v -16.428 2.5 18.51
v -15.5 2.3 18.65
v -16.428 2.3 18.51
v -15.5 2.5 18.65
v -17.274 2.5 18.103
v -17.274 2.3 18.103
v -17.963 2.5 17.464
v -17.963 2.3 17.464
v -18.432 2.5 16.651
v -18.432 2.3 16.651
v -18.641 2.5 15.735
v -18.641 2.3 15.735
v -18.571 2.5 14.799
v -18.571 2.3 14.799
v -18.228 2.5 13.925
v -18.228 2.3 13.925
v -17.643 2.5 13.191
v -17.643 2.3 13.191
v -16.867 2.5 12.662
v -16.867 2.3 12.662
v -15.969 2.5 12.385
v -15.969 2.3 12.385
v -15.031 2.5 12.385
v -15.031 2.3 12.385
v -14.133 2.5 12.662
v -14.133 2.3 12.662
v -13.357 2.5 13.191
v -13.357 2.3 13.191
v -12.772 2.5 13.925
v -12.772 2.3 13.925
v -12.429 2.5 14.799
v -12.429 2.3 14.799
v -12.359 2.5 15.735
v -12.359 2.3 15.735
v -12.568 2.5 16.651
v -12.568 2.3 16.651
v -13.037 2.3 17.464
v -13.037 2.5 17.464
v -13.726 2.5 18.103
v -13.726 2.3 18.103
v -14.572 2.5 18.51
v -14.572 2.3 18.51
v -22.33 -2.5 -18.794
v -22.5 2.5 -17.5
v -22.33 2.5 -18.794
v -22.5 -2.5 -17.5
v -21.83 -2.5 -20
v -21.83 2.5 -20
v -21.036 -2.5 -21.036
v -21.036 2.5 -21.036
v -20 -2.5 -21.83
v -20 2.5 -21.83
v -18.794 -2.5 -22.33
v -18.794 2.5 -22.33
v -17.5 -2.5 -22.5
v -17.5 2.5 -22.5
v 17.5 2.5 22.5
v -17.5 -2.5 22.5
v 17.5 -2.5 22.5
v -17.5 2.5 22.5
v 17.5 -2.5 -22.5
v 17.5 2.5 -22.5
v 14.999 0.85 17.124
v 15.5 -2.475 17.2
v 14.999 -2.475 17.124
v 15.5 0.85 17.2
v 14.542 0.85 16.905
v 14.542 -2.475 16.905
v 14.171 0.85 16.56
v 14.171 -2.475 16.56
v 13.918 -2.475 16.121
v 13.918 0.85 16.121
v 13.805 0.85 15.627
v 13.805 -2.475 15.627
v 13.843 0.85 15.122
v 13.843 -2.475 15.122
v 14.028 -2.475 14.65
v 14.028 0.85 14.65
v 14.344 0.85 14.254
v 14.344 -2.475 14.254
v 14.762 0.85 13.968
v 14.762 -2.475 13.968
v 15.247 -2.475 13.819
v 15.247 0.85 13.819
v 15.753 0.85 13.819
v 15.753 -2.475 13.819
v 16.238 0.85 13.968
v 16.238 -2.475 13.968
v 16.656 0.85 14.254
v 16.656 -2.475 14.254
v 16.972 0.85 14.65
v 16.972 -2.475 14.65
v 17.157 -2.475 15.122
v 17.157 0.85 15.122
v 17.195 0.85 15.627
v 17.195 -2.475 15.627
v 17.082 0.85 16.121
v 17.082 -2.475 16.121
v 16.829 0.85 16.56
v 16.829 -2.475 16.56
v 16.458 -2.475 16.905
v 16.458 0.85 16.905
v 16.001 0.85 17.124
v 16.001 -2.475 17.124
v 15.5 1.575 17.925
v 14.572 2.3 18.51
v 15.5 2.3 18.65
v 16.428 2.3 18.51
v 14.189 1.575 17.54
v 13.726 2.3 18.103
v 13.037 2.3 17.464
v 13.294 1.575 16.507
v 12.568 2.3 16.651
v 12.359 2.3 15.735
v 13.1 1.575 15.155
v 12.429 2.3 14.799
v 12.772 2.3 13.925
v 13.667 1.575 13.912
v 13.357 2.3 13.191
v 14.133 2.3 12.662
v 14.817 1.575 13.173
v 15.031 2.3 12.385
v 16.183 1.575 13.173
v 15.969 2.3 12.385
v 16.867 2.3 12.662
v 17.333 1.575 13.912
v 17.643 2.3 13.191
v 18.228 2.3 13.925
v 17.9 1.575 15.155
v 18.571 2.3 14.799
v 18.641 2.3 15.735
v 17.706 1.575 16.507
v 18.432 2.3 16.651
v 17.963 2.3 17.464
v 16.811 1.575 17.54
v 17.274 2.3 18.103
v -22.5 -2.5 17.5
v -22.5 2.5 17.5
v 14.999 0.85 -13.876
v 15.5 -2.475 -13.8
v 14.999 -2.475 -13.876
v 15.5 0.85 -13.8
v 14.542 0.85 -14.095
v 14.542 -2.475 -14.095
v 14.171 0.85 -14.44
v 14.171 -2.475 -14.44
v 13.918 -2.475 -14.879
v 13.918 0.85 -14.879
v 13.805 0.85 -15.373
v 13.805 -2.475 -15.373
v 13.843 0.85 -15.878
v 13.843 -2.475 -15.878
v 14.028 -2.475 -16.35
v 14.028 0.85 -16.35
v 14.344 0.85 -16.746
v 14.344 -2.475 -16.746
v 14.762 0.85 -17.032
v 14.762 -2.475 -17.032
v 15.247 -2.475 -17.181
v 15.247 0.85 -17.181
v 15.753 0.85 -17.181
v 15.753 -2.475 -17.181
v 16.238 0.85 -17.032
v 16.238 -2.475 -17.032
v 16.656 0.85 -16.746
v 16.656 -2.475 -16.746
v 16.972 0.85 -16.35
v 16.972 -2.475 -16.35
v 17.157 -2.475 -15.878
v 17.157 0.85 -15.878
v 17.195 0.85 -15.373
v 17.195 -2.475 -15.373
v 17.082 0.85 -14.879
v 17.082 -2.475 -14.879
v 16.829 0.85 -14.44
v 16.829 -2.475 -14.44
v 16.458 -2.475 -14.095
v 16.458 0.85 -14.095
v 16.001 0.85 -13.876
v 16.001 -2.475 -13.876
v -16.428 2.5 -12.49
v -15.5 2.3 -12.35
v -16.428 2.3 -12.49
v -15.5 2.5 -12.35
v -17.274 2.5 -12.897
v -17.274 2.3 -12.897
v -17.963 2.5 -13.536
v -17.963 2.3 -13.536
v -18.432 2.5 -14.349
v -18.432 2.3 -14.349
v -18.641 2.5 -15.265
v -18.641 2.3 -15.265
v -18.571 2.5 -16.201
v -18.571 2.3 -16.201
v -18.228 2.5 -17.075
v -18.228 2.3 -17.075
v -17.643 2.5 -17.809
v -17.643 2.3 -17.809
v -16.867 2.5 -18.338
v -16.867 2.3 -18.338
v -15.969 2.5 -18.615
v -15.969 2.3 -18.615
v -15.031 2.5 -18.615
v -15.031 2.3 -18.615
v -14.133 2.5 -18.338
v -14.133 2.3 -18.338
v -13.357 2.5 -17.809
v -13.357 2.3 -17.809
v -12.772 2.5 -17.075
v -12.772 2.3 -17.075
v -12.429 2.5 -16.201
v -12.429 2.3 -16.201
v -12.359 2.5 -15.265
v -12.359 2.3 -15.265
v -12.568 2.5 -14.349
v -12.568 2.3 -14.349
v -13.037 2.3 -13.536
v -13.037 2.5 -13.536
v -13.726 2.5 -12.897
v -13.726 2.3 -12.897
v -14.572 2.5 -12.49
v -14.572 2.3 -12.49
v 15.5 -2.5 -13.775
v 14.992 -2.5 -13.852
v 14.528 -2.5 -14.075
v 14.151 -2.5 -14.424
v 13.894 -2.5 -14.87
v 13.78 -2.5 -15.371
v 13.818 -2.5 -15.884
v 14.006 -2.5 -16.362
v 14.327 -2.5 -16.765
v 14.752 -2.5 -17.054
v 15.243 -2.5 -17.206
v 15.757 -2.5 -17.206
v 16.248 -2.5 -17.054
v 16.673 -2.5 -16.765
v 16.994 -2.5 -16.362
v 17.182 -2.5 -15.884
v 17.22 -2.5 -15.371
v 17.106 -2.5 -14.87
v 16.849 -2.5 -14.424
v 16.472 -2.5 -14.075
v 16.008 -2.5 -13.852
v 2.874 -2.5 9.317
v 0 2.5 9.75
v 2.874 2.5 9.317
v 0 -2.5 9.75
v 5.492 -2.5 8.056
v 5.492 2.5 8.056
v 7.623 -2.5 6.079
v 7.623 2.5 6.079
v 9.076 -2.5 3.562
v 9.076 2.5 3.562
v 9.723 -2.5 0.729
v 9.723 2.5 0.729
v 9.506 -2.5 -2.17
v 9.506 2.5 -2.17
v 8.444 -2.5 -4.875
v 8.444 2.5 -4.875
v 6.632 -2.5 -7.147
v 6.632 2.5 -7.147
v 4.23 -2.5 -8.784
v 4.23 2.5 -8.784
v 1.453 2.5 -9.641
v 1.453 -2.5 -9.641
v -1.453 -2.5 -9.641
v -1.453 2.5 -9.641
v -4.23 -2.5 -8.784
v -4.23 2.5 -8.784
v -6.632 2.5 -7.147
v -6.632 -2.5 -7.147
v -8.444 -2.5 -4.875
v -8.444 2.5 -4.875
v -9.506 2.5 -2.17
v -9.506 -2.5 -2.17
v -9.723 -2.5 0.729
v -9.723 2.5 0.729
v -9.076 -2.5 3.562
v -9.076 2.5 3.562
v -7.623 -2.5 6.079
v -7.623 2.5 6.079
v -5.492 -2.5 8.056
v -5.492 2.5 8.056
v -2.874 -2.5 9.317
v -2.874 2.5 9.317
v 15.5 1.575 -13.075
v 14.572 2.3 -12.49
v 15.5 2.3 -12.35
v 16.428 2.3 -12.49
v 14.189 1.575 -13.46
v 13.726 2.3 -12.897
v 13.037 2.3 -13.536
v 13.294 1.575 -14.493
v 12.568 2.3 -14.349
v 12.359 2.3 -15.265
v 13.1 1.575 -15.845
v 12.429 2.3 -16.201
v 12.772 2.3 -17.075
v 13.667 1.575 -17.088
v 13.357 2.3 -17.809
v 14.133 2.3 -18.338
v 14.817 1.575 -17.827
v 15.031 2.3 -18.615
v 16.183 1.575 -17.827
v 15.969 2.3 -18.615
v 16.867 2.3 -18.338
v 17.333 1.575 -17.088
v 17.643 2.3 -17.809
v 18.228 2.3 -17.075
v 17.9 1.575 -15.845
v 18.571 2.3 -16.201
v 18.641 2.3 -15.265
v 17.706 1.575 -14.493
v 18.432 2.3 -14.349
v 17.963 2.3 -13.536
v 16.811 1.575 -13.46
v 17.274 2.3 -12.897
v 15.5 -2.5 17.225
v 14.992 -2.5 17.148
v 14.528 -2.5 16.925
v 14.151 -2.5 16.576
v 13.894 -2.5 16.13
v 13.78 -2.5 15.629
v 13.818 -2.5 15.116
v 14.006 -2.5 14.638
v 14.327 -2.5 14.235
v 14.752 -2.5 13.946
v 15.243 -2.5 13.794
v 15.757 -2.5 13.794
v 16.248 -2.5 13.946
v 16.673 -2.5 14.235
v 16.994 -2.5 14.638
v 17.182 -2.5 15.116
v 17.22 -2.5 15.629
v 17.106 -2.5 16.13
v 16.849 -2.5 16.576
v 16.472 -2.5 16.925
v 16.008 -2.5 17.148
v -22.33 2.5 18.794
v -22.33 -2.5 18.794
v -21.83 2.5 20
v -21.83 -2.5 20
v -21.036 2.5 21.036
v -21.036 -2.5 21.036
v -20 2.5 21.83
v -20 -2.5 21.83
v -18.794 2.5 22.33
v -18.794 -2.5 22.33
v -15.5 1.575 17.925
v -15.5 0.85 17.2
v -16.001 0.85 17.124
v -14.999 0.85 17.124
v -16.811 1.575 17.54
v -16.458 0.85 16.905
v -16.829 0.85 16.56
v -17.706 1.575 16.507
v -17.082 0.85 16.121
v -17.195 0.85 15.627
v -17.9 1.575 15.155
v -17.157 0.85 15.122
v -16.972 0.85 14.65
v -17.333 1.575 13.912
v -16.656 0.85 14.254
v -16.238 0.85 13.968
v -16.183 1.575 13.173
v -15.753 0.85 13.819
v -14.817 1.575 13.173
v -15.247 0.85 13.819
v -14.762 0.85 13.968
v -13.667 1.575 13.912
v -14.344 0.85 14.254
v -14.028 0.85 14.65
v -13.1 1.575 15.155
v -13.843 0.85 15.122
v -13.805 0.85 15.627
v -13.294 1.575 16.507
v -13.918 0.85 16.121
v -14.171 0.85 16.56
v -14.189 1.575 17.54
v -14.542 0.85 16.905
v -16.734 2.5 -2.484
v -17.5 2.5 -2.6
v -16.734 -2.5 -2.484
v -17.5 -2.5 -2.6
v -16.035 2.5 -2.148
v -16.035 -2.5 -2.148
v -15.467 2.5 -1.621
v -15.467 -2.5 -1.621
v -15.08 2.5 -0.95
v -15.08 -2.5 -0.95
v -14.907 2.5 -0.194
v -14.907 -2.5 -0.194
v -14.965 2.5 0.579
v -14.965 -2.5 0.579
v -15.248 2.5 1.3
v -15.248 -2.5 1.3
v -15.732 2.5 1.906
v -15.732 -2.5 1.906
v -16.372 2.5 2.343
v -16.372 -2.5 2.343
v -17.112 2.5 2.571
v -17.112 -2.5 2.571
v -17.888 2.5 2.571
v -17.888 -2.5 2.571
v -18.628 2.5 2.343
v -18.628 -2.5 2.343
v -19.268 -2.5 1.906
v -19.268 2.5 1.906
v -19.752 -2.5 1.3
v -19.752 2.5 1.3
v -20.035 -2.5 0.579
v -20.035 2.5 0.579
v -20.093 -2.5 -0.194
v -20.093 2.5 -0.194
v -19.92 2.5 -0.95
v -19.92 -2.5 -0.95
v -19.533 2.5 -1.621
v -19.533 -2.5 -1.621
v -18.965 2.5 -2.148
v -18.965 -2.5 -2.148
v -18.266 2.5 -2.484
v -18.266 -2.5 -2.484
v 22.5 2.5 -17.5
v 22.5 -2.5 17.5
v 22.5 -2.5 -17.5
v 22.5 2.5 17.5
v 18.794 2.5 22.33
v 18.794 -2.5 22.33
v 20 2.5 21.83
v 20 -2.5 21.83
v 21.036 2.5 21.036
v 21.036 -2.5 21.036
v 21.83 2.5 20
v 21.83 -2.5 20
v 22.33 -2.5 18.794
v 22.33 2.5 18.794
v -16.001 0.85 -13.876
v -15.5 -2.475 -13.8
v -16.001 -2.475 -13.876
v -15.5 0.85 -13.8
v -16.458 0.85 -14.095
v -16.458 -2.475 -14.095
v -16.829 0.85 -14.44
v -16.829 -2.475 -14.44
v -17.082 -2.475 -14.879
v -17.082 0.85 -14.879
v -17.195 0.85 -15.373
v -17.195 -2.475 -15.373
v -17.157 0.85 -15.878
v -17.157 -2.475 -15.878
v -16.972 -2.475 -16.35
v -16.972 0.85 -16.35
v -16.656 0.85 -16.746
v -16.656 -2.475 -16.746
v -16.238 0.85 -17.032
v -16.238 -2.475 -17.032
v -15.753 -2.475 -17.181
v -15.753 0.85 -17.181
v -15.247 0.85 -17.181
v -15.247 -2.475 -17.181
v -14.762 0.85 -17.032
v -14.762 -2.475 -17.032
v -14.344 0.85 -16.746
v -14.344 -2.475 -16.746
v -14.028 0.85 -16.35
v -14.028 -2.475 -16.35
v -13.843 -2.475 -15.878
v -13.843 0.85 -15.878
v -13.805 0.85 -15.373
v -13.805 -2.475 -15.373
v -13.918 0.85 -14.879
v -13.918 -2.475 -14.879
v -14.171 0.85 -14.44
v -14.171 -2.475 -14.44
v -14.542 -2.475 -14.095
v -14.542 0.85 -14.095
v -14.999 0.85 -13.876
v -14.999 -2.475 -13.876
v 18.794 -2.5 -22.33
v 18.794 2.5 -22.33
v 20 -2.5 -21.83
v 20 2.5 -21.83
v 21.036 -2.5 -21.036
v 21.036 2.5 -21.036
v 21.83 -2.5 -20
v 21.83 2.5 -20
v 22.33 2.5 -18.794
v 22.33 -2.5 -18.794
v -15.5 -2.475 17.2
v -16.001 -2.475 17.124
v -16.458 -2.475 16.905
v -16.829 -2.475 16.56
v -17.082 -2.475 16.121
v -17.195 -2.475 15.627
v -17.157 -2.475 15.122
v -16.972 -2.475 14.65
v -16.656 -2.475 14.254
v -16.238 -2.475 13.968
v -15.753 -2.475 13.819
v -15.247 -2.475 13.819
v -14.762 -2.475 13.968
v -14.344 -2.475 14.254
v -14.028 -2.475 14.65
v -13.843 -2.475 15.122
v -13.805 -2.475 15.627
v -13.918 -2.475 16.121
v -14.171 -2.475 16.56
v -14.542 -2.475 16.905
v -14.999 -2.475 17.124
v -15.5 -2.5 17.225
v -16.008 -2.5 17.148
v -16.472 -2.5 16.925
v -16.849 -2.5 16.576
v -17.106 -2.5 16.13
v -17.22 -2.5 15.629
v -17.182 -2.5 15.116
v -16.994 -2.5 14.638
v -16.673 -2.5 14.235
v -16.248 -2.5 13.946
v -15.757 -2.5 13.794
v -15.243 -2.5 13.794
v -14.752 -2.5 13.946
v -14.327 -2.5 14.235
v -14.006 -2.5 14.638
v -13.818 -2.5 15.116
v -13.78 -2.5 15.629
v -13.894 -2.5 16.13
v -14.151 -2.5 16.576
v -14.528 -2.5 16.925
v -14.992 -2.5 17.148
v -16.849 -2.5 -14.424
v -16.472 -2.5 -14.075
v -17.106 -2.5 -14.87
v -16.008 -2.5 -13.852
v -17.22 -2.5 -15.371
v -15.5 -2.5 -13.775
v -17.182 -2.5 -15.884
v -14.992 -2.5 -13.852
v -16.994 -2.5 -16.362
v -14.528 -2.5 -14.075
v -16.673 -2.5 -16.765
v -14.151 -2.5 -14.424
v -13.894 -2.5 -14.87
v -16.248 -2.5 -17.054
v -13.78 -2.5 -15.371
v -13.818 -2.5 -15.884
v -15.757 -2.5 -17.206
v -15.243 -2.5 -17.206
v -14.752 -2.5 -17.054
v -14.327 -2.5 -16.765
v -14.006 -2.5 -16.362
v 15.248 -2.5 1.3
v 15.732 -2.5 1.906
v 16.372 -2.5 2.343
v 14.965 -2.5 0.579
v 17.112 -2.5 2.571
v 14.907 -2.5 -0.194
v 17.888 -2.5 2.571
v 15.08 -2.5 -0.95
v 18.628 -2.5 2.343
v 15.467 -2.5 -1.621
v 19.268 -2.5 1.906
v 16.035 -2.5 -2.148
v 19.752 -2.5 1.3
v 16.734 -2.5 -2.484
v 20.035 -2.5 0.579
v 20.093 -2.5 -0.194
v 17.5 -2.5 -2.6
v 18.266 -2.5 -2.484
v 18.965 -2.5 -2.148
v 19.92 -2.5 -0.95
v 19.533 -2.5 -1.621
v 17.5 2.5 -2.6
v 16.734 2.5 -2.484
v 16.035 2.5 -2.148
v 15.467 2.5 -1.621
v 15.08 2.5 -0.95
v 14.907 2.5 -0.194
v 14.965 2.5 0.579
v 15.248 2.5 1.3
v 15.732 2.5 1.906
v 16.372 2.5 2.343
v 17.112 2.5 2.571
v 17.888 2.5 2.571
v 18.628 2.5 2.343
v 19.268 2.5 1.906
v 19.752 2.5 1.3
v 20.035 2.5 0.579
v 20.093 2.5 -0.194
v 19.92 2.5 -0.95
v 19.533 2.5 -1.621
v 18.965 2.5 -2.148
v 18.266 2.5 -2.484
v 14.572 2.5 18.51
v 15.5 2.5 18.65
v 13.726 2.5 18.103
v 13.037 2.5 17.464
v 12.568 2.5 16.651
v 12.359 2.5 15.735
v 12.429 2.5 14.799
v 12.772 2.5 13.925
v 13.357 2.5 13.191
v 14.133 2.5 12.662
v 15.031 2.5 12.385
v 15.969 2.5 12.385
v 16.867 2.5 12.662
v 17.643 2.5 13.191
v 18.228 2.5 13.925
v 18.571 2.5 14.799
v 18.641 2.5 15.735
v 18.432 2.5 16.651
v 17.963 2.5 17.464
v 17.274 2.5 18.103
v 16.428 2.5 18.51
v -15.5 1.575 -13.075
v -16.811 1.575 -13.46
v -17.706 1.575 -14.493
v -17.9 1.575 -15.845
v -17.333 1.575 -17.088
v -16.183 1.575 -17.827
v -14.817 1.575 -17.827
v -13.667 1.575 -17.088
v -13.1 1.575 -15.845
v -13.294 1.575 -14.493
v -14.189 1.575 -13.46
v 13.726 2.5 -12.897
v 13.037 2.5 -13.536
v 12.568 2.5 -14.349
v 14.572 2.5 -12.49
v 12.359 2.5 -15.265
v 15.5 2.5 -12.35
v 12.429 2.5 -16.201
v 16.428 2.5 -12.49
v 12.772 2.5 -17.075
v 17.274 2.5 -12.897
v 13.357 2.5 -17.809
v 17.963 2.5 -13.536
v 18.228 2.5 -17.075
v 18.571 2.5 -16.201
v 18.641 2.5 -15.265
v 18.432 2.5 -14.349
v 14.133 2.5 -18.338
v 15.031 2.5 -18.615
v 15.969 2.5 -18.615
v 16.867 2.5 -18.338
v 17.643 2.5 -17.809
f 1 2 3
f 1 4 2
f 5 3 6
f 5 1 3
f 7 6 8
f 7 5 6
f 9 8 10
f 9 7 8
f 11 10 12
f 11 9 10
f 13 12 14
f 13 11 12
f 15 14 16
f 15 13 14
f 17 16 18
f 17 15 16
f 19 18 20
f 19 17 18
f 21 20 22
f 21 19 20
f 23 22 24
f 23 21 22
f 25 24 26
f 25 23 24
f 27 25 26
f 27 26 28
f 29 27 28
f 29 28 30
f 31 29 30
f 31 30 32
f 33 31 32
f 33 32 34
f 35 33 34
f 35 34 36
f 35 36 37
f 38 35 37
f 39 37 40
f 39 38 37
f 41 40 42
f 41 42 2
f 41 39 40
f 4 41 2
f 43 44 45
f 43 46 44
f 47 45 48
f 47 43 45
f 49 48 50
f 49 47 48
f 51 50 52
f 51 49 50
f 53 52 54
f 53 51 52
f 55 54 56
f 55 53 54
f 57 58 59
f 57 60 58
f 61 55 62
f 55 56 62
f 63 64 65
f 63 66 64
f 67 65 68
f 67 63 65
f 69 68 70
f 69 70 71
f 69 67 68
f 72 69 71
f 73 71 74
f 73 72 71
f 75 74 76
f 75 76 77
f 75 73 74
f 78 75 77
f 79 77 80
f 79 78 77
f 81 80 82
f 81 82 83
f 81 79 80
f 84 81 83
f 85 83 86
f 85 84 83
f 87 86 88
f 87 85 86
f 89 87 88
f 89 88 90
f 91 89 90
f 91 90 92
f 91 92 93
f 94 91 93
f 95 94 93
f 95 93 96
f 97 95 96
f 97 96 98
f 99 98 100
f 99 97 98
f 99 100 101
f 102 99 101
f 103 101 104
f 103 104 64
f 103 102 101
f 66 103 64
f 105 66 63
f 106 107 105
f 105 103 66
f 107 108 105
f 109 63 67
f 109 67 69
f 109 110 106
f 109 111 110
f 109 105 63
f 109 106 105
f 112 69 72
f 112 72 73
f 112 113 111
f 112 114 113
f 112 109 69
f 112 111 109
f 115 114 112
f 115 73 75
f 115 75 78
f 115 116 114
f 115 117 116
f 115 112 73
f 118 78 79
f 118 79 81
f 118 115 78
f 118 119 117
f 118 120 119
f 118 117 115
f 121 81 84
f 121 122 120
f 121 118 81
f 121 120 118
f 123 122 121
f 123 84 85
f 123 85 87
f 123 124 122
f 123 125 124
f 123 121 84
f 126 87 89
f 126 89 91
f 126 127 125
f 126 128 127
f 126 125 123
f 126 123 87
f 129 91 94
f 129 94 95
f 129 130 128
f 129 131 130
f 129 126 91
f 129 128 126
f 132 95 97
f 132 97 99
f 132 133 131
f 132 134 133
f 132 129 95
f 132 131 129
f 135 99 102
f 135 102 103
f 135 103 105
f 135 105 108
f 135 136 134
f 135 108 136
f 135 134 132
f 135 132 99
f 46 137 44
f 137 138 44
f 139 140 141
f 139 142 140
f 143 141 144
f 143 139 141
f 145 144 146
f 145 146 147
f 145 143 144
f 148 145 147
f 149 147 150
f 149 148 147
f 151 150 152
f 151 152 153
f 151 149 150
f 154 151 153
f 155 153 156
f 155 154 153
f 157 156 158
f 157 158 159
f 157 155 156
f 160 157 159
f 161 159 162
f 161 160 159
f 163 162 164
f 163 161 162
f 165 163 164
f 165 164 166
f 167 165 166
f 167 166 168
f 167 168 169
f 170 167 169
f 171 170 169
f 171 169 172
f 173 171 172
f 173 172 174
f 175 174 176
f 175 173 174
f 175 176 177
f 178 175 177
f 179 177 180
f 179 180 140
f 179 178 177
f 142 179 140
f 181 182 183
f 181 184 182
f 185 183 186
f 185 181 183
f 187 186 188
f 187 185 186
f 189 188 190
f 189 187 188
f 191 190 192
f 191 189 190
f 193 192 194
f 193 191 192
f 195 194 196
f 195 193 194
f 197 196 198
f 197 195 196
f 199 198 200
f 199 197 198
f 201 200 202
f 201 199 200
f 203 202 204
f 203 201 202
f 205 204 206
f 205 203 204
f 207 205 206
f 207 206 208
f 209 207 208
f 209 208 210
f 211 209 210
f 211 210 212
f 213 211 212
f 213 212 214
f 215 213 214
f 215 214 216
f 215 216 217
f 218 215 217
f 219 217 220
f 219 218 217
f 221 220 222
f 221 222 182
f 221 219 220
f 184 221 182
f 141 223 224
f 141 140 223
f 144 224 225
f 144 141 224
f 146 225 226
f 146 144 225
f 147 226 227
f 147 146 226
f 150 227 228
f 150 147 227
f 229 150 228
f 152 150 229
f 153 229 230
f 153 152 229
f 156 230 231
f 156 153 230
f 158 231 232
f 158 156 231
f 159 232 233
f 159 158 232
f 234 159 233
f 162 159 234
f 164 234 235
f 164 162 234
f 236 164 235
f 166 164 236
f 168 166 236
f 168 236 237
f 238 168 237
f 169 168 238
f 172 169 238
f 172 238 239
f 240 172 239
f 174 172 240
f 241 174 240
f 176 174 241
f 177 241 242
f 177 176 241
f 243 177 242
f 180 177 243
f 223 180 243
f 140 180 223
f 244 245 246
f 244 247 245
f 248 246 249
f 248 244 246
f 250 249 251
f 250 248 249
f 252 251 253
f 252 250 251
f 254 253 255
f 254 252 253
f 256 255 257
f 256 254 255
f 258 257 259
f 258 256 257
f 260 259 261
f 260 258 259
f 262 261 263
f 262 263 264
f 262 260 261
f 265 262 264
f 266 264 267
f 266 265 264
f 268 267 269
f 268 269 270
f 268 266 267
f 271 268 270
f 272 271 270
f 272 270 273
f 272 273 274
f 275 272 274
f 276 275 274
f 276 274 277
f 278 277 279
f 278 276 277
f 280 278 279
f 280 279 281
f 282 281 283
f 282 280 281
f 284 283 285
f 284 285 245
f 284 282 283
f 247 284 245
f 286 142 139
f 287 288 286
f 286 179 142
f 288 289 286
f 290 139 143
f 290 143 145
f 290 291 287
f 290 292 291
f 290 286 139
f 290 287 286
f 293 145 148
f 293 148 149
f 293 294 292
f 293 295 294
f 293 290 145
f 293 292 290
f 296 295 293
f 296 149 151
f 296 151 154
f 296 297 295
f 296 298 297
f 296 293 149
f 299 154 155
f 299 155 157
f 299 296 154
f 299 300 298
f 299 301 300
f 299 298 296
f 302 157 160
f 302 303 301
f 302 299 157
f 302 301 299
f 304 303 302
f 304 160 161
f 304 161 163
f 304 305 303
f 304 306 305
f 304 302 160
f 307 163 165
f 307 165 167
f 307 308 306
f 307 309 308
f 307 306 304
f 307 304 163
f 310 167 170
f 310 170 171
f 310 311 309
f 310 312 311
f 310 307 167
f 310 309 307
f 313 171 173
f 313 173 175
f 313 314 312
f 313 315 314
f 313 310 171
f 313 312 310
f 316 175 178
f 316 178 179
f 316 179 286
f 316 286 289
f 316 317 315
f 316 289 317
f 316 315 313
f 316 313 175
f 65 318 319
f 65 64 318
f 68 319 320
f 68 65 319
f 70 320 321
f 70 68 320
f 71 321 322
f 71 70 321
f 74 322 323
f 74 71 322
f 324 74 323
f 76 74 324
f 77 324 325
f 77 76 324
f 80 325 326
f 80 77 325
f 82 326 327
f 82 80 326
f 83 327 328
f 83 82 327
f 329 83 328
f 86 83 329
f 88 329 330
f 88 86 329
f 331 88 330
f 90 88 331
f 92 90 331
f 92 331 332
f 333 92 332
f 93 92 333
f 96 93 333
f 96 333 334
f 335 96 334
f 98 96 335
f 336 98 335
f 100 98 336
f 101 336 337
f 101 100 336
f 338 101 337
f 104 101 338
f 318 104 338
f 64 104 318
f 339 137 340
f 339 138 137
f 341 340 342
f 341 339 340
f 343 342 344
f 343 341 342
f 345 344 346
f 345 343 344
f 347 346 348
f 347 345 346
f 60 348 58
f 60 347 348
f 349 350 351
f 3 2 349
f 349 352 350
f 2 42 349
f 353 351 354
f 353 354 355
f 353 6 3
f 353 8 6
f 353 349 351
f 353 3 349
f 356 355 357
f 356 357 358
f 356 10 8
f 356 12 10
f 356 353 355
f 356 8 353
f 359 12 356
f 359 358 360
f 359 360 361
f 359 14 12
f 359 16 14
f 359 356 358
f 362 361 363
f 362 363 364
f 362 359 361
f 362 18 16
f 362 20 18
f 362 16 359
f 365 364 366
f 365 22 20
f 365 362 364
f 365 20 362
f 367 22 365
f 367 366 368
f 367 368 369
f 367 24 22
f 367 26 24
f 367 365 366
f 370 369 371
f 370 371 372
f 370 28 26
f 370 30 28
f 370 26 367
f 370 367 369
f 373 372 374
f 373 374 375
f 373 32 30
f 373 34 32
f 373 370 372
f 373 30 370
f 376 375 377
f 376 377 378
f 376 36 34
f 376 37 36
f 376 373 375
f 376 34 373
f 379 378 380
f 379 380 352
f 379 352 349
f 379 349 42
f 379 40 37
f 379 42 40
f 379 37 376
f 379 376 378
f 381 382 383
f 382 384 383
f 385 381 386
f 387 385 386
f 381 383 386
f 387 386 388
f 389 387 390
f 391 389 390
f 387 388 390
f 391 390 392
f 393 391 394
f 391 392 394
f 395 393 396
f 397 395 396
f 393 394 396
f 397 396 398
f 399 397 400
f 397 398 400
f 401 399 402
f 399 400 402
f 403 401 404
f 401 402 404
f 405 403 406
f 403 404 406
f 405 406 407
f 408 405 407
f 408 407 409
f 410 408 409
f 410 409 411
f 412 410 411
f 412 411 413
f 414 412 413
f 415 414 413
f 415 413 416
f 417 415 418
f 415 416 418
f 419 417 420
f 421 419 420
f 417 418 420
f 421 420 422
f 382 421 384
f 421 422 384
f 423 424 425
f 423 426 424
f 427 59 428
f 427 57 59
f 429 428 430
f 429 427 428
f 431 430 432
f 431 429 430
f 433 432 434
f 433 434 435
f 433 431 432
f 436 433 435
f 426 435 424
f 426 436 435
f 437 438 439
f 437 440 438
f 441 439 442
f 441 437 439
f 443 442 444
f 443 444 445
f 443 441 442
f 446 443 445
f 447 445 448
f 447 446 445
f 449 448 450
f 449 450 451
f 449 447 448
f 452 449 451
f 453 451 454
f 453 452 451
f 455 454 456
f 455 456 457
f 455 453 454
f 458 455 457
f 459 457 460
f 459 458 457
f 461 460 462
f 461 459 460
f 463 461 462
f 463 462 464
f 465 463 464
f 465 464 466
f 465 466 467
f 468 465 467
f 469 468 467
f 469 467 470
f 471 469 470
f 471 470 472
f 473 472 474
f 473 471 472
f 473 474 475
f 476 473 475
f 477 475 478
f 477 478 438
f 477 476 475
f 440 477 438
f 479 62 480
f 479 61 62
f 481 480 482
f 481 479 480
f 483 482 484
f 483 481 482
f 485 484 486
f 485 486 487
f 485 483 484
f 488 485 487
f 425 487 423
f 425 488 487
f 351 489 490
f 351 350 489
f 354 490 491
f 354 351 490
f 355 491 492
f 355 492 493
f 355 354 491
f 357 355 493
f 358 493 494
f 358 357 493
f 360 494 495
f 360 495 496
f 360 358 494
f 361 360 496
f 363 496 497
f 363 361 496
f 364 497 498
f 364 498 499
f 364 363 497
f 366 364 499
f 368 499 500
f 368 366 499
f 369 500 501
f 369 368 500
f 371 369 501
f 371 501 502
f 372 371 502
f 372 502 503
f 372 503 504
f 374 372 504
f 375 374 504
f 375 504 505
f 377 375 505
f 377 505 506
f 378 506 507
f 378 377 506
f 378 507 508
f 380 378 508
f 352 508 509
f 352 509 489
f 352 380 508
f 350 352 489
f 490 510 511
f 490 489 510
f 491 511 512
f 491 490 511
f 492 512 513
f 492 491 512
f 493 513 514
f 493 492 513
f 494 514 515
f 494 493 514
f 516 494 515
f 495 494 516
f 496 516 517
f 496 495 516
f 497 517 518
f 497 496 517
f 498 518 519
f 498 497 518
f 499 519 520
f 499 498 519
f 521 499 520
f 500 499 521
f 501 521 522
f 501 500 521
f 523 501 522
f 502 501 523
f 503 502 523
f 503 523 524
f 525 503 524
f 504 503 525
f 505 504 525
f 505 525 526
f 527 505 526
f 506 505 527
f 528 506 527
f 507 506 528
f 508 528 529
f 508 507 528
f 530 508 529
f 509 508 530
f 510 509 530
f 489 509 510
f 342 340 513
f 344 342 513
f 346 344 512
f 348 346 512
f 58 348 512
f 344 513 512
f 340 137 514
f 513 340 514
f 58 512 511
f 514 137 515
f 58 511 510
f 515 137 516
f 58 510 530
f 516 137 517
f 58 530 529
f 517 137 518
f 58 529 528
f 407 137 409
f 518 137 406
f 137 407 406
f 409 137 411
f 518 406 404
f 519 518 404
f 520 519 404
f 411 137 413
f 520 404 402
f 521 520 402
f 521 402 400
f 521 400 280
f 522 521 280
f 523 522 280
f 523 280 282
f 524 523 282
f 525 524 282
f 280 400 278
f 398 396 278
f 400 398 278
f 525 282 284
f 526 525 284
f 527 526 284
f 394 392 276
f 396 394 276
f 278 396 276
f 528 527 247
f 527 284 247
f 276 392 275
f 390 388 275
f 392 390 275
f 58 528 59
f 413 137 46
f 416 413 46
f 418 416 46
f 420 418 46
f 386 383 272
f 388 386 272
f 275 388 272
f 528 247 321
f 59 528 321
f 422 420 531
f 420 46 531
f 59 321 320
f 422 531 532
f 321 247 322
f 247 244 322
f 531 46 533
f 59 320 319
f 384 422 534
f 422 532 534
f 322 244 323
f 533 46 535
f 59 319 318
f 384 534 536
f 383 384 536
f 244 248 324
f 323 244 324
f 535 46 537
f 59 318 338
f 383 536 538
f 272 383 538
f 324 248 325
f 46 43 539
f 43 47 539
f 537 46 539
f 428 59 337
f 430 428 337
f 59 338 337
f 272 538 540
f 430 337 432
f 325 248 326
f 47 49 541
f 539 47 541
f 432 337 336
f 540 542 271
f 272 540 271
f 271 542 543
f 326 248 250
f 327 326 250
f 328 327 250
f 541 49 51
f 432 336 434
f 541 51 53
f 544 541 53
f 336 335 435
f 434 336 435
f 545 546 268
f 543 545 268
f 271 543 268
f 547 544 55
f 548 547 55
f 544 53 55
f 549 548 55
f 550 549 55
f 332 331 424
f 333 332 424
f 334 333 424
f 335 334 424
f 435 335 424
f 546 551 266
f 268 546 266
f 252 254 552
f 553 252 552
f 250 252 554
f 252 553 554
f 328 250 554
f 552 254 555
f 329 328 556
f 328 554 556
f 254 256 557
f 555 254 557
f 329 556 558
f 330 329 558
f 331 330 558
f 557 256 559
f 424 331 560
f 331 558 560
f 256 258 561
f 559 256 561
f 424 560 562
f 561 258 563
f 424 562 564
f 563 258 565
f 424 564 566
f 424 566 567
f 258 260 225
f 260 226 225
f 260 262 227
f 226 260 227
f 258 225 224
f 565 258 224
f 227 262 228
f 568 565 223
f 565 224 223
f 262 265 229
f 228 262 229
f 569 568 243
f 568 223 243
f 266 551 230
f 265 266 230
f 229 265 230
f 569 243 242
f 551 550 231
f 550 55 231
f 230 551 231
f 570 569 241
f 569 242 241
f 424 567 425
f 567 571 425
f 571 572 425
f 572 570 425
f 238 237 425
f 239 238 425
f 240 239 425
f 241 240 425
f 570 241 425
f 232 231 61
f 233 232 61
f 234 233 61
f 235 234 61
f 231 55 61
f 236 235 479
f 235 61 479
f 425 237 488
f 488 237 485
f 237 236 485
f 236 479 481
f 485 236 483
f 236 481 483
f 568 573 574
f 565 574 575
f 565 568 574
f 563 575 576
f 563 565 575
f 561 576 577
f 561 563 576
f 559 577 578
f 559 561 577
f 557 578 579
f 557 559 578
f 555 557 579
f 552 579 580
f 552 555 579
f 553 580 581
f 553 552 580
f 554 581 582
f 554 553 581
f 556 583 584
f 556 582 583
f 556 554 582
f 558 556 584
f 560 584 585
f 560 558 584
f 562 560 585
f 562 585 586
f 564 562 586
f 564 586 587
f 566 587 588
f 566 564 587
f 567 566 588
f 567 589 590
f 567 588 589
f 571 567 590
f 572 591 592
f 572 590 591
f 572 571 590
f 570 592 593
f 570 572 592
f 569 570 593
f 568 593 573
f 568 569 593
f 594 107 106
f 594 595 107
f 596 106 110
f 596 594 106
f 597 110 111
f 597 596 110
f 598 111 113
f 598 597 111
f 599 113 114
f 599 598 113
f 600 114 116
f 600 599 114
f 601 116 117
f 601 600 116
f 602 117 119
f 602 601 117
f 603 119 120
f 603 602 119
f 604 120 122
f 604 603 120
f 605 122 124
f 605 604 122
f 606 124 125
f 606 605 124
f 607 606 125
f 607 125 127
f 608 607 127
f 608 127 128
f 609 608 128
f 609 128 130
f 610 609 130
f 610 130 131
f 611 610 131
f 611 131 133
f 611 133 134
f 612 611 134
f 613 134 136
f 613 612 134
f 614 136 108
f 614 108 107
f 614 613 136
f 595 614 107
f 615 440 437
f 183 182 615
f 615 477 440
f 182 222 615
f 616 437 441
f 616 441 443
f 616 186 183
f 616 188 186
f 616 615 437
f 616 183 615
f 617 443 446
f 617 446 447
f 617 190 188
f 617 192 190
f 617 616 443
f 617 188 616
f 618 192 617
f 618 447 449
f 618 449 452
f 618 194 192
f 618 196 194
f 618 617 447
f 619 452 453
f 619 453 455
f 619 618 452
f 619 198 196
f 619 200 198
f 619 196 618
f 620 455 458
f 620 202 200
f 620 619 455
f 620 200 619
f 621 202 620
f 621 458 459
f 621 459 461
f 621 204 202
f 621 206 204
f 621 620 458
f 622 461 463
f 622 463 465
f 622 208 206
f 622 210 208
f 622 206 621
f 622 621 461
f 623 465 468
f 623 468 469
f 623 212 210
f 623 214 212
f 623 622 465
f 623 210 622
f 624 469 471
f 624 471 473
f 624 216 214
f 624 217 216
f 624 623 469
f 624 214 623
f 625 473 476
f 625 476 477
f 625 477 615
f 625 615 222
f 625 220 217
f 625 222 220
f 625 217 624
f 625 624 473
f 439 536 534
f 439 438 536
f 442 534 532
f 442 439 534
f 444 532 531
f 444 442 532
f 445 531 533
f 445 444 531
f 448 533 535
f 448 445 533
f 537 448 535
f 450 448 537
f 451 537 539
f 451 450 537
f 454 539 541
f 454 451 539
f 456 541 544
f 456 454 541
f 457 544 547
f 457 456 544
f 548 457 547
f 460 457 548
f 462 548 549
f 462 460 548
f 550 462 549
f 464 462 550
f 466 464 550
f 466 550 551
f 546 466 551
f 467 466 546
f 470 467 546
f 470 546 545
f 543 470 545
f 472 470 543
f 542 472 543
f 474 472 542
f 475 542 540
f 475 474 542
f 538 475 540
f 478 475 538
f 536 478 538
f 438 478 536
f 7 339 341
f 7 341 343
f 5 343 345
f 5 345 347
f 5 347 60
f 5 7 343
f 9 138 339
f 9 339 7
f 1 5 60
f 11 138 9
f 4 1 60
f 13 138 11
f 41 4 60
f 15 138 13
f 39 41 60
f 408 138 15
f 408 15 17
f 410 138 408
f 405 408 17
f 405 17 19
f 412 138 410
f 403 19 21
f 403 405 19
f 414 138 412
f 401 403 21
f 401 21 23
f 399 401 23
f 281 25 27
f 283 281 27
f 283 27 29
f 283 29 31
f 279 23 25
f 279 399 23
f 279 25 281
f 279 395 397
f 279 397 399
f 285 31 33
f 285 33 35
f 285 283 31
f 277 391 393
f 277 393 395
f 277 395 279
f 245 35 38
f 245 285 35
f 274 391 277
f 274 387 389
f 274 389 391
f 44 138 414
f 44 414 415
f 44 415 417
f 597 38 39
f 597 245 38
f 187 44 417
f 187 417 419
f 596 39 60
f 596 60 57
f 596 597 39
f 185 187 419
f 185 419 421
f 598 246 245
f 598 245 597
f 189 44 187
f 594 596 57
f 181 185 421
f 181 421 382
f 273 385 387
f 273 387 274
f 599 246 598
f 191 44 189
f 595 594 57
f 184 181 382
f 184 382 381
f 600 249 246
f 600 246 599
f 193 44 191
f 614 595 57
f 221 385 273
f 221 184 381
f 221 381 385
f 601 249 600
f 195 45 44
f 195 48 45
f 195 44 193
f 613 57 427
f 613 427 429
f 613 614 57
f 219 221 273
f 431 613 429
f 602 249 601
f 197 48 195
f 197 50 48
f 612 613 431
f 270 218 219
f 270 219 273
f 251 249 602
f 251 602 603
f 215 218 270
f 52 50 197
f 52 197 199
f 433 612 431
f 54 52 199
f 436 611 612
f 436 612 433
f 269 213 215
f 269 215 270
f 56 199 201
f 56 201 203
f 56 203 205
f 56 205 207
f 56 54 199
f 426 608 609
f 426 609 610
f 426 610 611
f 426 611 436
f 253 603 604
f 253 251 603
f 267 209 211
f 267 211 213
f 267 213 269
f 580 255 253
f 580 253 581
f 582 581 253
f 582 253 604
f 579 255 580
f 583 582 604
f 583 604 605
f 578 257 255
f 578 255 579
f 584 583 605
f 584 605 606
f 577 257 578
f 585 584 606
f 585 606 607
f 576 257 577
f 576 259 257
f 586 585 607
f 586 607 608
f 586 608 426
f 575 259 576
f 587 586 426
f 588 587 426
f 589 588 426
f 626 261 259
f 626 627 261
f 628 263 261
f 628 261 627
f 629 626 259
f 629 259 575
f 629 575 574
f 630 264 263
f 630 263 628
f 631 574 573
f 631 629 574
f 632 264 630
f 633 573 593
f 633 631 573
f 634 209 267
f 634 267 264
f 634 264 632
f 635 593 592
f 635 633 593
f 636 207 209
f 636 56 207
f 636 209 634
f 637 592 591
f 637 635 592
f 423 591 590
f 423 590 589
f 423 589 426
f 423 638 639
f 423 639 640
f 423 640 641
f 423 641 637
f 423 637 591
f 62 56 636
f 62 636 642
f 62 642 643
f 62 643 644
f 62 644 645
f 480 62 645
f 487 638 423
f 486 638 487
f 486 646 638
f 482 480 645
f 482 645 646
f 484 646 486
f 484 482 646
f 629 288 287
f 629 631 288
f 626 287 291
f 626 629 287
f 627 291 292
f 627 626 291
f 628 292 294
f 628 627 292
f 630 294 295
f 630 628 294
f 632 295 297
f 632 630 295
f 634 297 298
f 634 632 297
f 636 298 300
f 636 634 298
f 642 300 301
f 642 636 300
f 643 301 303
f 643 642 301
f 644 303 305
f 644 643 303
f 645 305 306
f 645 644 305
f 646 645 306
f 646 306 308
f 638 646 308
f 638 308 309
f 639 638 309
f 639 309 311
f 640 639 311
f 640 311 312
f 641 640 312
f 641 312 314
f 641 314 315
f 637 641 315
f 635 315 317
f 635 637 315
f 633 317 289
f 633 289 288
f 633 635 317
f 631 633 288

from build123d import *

# Parameters (mm, degrees)
ESBO_O1_W                                    = 45
ESBO_O1_H                                    = 45
ESBO_O1_R                                    = 9.75
RESSALTO_EXTRUS_O1_DEPTH                     = 2.5
ESCAREADO_PARA_PARAFUSO_COM_CABE_A_E_2_COUNT = 2
ESCAREADO_PARA_PARAFUSO_COM_CABE_A_E_2_PITCH = 31
ESCAREADO_PARA_PARAFUSO_COM_CABE_A_E_3_COUNT = 2
ESCAREADO_PARA_PARAFUSO_COM_CABE_A_E_3_PITCH = 43.840620434
ESCAREADO_PARA_PARAFUSO_COM_CABE_A_E_4_COUNT = 2
ESCAREADO_PARA_PARAFUSO_COM_CABE_A_E_4_PITCH = 31
FILETE1_R                                    = 5


with BuildPart() as part:
    # Esboço1 → Ressalto-extrusão1 (new, symmetric)
    with BuildSketch(Plane(origin=(0, 0, 0), x_dir=(1, 0, 0), z_dir=(0, 1, 0))):
        Rectangle(ESBO_O1_W, ESBO_O1_H)
        with Locations(Location((0, 0, 0), (0, 0, 270))):
            Circle(ESBO_O1_R, mode=Mode.SUBTRACT)
    extrude(amount=RESSALTO_EXTRUS_O1_DEPTH, both=True)

    # Esboço4 → Escareado para parafuso com cabeça escareada elevada de M31 (revolve, cut)
    with BuildSketch(Plane(origin=(-15.5, 2.5, -15.5), x_dir=(0, 0, 1), z_dir=(1, 0, 0))):
        Polygon((0, 0), (0, 5), (1.725, 5), (1.7, 4.975), (1.7, 1.65), (3.15, 0.2), (3.15, 0), align=None)
    escareado_para_parafuso_com_cabe_a_escar = revolve(axis=Axis((-15.5, 8.85, -15.5), (0, -1, 0)), mode=Mode.SUBTRACT)

    # Escareado para parafuso com cabe_a e 2: Escareado para parafuso com cabeça escareada elevada de M31 ×2
    with Locations(*[(i * ESCAREADO_PARA_PARAFUSO_COM_CABE_A_E_2_PITCH, 0, 0) for i in range(1, ESCAREADO_PARA_PARAFUSO_COM_CABE_A_E_2_COUNT)]):
        add(escareado_para_parafuso_com_cabe_a_escar, mode=Mode.SUBTRACT)

    # Escareado para parafuso com cabe_a e 3: Escareado para parafuso com cabeça escareada elevada de M31 ×2
    with Locations(*[Vector(0.7071067811865447, 0, 0.7071067811865503) * (i * ESCAREADO_PARA_PARAFUSO_COM_CABE_A_E_3_PITCH) for i in range(1, ESCAREADO_PARA_PARAFUSO_COM_CABE_A_E_3_COUNT)]):
        add(escareado_para_parafuso_com_cabe_a_escar, mode=Mode.SUBTRACT)

    # Escareado para parafuso com cabe_a e 4: Escareado para parafuso com cabeça escareada elevada de M31 ×2
    with Locations(*[(0, 0, i * ESCAREADO_PARA_PARAFUSO_COM_CABE_A_E_4_PITCH) for i in range(1, ESCAREADO_PARA_PARAFUSO_COM_CABE_A_E_4_COUNT)]):
        add(escareado_para_parafuso_com_cabe_a_escar, mode=Mode.SUBTRACT)

    # Filete1
    filete1_edges = [part.edges().sort_by_distance(p)[0] for p in [
        (22.5, 0, 22.5),
        (-22.5, 0, 22.5),
        (-22.5, 0, -22.5),
        (22.5, 0, -22.5),
    ]]
    fillet(filete1_edges, radius=FILETE1_R)

    # Esboço5 → Furo de diâmetro Ø5.2 (5.2)1 (revolve, cut)
    with BuildSketch(Plane(origin=(17.5, -2.5, 0), x_dir=(0, 0, -1), z_dir=(1, 0, 0))):
        Polygon((0, 0), (0, 47.562237609), (2.6, 46), (2.6, 0), align=None)
    furo_de_di_metro_5_2_5_2_1 = revolve(axis=Axis((17.5, -8.85, 0), (0, 1, 0)), mode=Mode.SUBTRACT)

    # Espelhar1: Furo de diâmetro Ø5.2 (5.2)1 across plane
    add(furo_de_di_metro_5_2_5_2_1.mirror(Plane(origin=(0, 0, 0), x_dir=(0, 0, 1), z_dir=(1, 0, 0))), mode=Mode.SUBTRACT)


solid = part.part
